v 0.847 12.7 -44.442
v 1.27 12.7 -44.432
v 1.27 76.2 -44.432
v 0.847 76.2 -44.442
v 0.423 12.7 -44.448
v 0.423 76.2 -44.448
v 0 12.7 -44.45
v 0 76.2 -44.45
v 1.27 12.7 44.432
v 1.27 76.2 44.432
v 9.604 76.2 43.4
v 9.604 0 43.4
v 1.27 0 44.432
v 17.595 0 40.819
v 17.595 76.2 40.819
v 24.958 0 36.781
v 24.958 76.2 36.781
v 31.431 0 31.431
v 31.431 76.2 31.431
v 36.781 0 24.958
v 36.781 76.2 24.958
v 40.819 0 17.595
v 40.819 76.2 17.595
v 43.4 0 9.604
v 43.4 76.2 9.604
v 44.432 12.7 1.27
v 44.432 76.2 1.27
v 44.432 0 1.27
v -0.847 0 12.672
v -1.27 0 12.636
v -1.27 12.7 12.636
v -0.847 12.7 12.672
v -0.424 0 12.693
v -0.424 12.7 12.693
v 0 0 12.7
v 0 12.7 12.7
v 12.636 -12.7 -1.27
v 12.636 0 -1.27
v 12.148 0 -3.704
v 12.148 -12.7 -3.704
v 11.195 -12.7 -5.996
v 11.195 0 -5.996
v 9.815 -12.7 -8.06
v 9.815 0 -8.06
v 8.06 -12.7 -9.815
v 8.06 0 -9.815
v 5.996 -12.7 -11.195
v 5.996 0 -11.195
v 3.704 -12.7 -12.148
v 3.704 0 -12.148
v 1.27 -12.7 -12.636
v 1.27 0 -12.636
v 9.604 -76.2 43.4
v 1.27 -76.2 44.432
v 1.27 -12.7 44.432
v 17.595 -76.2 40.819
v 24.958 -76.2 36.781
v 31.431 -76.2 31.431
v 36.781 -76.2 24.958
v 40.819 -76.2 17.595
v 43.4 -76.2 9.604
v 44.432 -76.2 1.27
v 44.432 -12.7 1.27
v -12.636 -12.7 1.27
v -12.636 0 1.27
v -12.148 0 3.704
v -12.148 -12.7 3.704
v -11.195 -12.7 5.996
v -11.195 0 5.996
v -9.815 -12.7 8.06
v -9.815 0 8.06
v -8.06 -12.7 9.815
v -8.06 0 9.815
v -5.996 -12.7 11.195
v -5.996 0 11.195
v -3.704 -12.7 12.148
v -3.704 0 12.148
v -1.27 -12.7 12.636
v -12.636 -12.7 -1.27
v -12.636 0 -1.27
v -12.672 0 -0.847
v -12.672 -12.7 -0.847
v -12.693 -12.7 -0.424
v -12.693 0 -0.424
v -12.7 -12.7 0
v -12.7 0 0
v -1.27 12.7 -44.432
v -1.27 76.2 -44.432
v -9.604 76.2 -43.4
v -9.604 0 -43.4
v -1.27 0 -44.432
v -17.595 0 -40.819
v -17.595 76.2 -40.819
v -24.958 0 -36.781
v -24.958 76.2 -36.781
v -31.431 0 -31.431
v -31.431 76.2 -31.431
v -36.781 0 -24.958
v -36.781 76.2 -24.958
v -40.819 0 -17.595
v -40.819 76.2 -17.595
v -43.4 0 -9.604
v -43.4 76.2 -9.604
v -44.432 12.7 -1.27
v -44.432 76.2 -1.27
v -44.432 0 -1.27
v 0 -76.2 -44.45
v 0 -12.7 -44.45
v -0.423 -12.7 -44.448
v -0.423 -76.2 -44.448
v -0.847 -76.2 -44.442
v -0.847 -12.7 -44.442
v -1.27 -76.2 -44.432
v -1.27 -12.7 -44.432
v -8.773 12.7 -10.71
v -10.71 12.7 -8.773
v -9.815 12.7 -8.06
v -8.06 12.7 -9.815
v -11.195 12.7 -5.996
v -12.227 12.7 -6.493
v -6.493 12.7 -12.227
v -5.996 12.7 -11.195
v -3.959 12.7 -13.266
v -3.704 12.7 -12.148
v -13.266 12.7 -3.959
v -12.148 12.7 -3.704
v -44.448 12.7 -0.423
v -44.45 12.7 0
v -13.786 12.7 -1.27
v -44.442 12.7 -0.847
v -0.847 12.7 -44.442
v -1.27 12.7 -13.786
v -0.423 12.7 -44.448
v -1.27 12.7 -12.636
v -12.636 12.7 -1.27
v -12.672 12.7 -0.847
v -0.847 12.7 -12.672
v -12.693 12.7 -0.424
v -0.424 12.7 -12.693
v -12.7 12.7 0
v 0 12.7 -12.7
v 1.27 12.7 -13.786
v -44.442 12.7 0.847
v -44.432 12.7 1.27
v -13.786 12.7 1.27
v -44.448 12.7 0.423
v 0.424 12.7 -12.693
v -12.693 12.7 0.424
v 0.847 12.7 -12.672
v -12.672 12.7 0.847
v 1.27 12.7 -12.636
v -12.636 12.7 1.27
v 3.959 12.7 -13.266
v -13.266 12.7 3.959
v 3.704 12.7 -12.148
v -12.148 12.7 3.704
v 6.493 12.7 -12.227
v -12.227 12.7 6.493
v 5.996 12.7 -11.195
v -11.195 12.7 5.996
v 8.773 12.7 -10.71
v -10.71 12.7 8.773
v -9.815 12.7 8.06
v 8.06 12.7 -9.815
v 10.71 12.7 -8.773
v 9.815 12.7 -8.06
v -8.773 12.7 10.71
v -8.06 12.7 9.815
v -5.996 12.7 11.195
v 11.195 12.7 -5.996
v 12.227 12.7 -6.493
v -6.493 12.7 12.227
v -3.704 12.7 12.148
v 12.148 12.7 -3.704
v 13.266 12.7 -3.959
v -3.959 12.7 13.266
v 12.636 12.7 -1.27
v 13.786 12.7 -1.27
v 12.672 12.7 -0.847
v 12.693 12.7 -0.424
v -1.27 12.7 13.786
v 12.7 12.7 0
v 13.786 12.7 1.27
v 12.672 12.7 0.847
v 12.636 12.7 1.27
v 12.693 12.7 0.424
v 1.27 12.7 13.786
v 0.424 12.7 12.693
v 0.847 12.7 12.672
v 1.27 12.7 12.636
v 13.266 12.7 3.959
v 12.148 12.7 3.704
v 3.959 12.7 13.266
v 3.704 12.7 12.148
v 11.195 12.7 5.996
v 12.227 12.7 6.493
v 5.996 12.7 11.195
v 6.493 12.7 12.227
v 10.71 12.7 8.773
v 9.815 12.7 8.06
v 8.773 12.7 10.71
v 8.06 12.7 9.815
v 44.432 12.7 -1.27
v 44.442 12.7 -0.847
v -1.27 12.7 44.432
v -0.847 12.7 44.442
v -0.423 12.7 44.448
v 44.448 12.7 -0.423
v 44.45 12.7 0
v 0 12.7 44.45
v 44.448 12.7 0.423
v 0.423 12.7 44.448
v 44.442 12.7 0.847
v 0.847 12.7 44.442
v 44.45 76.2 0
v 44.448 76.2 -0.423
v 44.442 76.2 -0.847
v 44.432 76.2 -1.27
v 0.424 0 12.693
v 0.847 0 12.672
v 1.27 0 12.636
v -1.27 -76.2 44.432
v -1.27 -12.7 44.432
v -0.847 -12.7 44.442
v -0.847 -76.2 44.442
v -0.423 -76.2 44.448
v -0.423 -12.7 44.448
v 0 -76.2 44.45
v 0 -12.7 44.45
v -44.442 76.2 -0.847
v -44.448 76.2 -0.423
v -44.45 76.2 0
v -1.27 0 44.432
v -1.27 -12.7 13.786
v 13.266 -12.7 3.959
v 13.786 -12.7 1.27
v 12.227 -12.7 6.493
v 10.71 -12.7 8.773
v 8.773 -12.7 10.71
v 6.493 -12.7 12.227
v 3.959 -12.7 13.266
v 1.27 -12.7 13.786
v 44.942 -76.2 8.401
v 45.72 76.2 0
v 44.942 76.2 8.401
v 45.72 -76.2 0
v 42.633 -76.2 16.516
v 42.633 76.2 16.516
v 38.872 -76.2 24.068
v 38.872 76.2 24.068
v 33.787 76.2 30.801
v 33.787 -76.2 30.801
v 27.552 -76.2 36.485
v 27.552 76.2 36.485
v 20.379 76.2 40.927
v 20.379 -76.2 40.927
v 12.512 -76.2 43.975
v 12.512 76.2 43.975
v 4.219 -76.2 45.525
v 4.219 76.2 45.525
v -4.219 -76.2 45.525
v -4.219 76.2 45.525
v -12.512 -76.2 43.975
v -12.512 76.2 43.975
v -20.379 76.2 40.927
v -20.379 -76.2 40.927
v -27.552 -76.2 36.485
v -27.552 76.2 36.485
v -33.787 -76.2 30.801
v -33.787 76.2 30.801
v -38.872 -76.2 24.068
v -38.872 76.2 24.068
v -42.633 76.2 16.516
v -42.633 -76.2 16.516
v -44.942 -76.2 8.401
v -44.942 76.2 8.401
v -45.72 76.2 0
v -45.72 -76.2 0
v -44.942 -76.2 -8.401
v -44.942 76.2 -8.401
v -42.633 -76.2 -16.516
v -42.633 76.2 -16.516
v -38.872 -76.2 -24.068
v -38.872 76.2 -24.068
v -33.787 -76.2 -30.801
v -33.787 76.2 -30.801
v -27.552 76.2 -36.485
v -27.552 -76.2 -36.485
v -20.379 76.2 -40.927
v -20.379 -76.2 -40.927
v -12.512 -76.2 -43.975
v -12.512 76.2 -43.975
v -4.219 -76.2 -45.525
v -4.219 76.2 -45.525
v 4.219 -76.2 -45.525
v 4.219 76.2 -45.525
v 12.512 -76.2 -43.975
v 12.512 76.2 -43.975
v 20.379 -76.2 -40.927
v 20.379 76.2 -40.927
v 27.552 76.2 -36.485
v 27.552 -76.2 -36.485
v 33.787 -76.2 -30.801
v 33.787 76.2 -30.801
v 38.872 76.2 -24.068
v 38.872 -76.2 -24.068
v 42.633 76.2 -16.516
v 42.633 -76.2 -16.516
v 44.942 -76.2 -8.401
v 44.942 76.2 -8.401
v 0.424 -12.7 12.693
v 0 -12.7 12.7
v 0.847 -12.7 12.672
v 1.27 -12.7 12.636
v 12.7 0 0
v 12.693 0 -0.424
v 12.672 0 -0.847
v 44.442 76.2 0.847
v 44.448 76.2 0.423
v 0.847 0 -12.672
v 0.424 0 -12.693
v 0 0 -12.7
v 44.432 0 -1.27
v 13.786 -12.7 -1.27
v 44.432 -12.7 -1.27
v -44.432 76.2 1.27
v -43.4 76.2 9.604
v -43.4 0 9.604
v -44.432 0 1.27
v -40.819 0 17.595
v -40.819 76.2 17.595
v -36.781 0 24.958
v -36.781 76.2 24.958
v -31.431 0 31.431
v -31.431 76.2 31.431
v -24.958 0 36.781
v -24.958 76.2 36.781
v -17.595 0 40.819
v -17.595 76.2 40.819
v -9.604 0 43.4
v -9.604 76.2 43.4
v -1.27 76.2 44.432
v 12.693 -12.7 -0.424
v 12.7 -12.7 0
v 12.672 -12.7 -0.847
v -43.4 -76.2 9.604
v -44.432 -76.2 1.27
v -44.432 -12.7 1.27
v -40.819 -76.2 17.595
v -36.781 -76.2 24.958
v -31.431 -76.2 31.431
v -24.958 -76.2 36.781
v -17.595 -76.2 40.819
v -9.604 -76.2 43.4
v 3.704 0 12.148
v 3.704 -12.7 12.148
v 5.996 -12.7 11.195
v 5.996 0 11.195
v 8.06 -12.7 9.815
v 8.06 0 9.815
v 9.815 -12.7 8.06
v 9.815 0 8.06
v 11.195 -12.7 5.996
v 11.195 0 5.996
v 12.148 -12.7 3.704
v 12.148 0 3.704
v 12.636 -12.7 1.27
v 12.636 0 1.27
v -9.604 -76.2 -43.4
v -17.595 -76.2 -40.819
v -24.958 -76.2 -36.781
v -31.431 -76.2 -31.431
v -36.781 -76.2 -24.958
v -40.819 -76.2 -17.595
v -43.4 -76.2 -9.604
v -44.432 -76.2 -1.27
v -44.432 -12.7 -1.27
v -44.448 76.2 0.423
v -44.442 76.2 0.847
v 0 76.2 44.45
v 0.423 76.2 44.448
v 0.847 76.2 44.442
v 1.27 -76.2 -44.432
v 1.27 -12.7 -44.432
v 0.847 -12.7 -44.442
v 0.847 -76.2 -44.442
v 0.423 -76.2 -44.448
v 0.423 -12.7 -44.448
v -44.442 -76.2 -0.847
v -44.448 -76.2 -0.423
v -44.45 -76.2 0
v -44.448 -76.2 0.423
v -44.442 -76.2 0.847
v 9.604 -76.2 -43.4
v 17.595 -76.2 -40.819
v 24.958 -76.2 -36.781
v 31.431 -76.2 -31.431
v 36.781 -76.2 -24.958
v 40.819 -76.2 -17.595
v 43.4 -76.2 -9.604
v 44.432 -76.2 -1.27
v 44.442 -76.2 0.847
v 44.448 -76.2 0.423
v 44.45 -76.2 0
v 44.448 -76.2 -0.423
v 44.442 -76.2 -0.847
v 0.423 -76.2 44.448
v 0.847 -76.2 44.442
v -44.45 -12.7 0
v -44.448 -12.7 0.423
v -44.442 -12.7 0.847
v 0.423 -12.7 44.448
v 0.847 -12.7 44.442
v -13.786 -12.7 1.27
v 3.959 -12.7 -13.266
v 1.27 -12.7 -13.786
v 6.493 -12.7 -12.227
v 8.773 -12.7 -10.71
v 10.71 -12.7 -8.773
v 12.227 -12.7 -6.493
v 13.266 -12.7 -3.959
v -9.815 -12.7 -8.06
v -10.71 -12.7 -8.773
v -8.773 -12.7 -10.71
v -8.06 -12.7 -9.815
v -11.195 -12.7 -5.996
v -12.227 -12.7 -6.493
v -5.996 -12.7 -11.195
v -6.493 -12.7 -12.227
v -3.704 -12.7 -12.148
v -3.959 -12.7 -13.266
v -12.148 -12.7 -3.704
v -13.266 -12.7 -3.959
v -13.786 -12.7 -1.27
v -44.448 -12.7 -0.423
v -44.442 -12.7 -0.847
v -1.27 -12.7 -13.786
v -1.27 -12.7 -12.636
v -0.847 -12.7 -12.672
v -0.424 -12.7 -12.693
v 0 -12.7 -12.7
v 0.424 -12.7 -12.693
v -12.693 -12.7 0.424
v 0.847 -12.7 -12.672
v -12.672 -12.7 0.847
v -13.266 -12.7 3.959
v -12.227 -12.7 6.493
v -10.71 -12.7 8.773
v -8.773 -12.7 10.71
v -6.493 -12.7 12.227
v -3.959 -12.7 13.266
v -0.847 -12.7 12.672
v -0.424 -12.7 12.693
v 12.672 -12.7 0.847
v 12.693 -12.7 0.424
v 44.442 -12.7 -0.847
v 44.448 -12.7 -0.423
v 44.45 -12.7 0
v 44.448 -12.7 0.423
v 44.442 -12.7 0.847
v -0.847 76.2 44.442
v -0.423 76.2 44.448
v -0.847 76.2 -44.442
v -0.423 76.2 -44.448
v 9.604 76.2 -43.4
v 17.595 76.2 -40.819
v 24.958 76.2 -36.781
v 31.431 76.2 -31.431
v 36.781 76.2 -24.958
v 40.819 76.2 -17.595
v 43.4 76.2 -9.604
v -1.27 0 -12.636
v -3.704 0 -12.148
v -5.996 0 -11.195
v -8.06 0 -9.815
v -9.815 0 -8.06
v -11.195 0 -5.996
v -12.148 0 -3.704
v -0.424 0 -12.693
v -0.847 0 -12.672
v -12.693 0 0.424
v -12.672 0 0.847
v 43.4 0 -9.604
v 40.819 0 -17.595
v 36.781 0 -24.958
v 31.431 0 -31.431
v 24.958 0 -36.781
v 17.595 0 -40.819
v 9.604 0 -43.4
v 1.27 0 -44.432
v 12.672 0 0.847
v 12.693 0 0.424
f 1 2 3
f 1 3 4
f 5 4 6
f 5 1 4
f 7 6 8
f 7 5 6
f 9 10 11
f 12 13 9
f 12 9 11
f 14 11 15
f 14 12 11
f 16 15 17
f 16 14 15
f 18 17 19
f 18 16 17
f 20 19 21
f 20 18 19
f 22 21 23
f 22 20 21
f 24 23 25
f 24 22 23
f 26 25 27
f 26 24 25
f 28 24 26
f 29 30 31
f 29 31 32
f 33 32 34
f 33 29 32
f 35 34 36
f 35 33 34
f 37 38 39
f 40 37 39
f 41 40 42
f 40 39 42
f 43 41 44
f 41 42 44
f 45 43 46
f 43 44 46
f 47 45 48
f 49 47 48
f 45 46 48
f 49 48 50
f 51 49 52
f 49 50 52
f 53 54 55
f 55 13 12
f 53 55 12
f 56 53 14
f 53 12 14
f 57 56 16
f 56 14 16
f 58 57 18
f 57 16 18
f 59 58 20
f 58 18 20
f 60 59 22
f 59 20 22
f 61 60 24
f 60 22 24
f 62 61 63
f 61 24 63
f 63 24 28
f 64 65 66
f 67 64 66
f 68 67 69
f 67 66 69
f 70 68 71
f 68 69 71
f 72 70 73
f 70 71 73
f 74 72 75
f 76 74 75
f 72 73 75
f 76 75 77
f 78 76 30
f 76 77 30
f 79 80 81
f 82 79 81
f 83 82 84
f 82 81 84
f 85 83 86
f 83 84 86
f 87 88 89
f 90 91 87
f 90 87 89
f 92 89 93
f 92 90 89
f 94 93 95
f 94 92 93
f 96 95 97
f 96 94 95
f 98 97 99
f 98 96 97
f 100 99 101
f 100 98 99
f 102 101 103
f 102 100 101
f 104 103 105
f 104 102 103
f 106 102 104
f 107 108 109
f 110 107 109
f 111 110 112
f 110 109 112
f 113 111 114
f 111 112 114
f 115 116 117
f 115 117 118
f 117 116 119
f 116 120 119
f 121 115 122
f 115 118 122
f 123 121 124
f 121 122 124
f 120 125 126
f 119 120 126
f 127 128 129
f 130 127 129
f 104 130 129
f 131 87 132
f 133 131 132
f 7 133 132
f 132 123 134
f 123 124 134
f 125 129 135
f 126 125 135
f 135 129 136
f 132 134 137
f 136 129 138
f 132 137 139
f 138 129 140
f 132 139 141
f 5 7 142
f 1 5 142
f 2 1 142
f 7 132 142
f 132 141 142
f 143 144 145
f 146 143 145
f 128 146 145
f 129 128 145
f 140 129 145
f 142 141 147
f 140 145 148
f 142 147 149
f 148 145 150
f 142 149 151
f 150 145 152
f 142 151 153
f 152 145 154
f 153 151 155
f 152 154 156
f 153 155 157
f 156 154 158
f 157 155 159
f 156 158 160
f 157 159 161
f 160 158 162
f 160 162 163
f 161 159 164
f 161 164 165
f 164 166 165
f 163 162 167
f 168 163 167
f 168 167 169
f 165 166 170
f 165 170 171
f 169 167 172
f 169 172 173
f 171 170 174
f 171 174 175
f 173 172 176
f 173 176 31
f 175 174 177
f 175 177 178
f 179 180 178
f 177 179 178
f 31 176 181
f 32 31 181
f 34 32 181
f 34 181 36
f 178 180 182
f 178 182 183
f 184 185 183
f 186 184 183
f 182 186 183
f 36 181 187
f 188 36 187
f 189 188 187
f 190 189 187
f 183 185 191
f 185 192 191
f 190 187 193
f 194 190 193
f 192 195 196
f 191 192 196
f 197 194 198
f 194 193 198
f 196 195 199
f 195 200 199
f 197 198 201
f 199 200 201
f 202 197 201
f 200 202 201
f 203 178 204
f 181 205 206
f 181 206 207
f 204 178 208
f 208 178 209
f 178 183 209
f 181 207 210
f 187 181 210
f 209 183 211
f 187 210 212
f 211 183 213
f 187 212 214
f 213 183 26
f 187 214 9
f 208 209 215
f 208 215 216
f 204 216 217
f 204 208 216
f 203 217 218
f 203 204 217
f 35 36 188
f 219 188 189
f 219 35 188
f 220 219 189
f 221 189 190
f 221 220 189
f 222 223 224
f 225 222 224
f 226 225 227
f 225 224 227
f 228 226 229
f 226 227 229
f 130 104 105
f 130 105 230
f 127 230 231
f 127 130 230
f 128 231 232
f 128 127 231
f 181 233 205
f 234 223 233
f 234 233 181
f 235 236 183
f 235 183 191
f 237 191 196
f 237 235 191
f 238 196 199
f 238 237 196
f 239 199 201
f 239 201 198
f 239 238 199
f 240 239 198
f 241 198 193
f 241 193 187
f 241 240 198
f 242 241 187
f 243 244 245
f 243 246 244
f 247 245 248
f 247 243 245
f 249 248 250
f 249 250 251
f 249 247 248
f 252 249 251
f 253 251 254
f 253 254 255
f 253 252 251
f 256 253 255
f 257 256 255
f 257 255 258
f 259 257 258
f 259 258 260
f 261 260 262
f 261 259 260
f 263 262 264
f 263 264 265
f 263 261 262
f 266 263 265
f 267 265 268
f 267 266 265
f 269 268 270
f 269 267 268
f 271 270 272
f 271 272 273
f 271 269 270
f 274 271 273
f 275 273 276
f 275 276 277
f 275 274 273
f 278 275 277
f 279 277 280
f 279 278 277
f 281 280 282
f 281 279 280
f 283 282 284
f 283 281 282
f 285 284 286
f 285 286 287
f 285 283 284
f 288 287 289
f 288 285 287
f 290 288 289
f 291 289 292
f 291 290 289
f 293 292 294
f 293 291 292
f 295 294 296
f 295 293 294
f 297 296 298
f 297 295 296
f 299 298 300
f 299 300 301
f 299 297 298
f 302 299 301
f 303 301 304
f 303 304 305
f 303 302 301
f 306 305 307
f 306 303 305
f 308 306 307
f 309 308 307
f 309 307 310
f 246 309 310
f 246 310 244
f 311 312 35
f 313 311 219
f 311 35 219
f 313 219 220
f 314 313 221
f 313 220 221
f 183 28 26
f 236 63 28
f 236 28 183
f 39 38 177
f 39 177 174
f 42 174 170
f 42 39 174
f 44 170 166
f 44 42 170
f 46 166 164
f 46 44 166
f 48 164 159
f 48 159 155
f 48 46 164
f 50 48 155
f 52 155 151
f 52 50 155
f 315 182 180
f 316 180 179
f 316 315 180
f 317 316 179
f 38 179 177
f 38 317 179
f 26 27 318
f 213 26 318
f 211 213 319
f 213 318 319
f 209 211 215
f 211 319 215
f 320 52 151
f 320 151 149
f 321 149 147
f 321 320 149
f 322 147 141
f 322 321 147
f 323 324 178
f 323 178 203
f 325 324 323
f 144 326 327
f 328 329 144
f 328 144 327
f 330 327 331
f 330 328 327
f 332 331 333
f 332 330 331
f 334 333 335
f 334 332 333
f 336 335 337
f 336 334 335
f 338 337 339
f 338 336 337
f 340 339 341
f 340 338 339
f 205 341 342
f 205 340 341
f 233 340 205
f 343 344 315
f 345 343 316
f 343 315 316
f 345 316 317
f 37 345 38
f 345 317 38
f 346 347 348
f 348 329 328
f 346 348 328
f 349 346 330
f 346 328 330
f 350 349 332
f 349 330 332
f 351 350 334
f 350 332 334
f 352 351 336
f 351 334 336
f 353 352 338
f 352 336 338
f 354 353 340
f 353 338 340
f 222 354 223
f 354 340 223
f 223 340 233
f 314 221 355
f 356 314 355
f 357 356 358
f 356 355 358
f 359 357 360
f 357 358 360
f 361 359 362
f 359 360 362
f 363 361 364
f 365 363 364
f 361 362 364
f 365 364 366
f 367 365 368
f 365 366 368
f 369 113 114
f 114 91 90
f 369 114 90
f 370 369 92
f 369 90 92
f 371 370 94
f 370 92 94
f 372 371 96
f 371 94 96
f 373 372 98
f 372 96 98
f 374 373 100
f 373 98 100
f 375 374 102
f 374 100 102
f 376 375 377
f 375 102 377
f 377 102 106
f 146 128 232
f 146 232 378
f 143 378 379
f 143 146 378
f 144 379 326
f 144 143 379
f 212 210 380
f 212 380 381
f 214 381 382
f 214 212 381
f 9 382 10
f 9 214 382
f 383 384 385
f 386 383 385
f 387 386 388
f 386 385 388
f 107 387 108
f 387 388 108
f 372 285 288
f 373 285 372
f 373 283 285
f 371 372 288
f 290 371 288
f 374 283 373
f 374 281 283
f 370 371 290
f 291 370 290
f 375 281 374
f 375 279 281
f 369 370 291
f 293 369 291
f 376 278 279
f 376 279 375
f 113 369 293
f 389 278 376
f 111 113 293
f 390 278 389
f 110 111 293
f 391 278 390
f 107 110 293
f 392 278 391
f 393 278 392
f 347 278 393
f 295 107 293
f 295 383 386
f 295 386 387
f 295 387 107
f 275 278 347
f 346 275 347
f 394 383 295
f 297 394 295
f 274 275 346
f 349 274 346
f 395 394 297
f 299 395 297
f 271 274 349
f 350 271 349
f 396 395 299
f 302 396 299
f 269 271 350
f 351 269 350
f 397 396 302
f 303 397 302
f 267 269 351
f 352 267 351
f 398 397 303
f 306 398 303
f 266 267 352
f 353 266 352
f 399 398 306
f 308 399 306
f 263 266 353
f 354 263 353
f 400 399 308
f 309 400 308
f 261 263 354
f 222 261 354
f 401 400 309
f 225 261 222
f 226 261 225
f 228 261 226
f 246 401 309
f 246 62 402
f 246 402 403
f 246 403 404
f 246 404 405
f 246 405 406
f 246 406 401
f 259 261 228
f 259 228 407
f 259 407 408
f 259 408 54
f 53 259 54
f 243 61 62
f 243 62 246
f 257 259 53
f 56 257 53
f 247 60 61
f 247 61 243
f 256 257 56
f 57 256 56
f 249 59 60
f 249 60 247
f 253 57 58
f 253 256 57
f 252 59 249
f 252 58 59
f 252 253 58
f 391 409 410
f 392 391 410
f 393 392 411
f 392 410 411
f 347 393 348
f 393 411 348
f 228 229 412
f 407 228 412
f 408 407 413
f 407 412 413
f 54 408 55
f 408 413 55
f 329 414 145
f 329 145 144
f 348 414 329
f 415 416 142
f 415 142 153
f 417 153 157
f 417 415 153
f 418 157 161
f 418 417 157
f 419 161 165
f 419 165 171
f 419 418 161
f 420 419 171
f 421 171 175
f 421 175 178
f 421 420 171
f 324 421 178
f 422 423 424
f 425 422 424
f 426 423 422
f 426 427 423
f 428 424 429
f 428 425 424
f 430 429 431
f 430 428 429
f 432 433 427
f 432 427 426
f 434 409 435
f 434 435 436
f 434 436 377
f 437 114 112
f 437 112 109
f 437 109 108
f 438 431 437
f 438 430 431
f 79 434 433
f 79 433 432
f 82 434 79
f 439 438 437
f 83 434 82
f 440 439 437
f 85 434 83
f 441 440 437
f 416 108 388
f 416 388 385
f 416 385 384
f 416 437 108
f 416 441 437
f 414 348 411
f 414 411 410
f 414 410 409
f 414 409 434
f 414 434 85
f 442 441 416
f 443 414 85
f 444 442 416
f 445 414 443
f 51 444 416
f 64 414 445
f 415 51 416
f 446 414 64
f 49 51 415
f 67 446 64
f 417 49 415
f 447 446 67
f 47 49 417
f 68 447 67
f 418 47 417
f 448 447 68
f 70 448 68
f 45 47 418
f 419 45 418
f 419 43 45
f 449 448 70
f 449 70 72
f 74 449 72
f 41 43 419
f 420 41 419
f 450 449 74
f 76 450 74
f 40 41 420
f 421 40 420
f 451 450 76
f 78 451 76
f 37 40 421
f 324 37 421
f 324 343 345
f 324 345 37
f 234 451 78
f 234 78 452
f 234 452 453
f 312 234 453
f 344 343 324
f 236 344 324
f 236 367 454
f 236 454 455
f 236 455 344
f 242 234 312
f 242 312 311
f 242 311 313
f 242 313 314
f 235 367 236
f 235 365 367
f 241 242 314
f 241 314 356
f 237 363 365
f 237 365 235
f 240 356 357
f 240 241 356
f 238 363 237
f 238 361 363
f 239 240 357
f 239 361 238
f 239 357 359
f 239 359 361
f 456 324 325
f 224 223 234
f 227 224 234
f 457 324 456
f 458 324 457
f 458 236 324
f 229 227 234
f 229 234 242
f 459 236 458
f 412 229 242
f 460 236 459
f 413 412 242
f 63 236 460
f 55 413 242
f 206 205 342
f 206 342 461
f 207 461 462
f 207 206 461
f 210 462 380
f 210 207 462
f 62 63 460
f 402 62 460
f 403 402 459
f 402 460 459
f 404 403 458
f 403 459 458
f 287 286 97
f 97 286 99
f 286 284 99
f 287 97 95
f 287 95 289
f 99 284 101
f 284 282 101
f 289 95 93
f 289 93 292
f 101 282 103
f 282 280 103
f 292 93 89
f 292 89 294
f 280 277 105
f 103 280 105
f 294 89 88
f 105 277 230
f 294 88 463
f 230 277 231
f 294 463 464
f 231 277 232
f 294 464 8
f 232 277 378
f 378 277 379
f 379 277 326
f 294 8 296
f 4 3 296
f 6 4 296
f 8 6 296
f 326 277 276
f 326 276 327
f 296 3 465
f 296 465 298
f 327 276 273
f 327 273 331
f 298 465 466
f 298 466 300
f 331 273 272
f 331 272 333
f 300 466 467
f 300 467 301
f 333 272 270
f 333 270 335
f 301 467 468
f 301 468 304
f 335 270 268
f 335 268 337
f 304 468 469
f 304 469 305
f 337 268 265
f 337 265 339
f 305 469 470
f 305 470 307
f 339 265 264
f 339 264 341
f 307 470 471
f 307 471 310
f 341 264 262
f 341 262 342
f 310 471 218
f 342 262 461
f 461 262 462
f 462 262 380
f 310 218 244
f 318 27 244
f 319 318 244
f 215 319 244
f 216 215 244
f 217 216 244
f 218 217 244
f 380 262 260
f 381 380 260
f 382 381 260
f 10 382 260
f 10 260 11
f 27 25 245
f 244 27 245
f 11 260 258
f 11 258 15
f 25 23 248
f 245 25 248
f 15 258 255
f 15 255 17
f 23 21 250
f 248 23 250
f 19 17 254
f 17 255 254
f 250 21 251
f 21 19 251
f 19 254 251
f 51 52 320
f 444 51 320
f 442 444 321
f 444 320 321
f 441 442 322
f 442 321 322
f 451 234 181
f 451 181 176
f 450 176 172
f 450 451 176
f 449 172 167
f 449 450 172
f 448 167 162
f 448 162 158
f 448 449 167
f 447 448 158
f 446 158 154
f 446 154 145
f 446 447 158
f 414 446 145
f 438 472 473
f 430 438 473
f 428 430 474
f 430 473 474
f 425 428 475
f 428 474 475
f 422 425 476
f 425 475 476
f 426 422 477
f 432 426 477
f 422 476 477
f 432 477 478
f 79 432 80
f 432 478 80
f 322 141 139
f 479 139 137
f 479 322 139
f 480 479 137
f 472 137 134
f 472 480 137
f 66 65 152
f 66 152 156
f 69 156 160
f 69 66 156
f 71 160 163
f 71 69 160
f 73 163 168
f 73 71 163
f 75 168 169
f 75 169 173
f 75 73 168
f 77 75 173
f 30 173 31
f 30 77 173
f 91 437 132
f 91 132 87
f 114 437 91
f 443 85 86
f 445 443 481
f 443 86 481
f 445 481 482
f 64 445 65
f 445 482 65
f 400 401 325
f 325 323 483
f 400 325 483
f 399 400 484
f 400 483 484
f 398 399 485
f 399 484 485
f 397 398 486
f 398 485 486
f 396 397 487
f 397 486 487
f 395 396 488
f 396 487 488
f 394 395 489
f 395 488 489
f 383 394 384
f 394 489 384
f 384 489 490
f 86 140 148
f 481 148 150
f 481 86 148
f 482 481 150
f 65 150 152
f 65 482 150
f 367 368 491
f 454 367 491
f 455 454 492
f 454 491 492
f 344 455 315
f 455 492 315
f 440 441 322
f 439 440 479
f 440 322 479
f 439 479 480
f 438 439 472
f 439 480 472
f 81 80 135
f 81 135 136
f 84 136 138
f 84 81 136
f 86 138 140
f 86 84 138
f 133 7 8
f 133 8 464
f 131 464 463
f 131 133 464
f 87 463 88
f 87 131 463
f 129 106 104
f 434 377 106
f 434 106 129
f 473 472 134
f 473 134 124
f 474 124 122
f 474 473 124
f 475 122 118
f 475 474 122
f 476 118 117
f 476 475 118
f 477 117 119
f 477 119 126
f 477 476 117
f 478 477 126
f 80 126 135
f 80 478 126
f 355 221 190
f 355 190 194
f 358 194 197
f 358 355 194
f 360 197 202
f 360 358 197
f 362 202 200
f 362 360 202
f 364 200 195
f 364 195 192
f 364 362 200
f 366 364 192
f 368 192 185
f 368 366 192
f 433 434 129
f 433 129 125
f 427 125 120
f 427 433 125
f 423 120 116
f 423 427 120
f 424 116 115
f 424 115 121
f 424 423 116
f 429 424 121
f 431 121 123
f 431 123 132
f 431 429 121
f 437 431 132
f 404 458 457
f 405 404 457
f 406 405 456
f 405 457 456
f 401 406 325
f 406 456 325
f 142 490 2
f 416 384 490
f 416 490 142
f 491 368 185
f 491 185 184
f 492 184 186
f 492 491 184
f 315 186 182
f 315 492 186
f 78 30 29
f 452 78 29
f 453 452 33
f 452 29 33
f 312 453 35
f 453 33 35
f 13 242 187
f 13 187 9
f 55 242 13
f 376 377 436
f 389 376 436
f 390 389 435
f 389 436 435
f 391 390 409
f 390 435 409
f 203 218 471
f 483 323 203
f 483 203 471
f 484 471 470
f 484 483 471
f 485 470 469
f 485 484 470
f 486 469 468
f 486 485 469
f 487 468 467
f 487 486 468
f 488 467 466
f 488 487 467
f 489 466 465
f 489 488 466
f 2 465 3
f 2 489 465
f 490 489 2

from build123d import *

# Parameters (mm, degrees)
F0_R     = 45.72
F1_DEPTH = 76.2
F2_DEPTH = 12.7


with BuildPart() as f1:
    # F0 (on Front) → F1 (new body, symmetric)
    with BuildSketch(Plane.XZ):
        Circle(F0_R)
        with BuildLine():
            ThreePointArc((44.4318571429, 1.2698704016), (44.4454640543, 0.635), (44.45, 0))
            ThreePointArc((44.45, 0), (44.4454640543, -0.635), (44.4318571429, -1.2698704016))
            ThreePointArc((44.4318571429, -1.2698704016), (31.4308964237, -31.4308964237), (1.2698704016, -44.4318571429))
            ThreePointArc((1.2698704016, -44.4318571429), (0.635, -44.4454640543), (0, -44.45))
            ThreePointArc((0, -44.45), (-0.635, -44.4454640543), (-1.2698704016, -44.4318571429))
            ThreePointArc((-1.2698704016, -44.4318571429), (-31.4308964237, -31.4308964237), (-44.4318571429, -1.2698704016))
            ThreePointArc((-44.4318571429, -1.2698704016), (-44.4454640543, -0.635), (-44.45, 0))
            ThreePointArc((-44.45, 0), (-44.4454640543, 0.635), (-44.4318571429, 1.2698704016))
            ThreePointArc((-44.4318571429, 1.2698704016), (-31.4308964237, 31.4308964237), (-1.2698704016, 44.4318571429))
            ThreePointArc((-1.2698704016, 44.4318571429), (-0.635, 44.4454640543), (0, 44.45))
            ThreePointArc((0, 44.45), (0.635, 44.4454640543), (1.2698704016, 44.4318571429))
            ThreePointArc((1.2698704016, 44.4318571429), (31.4308964237, 31.4308964237), (44.4318571429, 1.2698704016))
        make_face(mode=Mode.SUBTRACT)
    extrude(amount=F1_DEPTH, both=True)

    # F0 (on Front) → F2 (join, symmetric)
    with BuildSketch(Plane.XZ):
        with BuildLine():
            Line((-12.6363534757, 1.2698704016), (-13.7860050542, 1.2698704016))
            ThreePointArc((-13.7860050542, 1.2698704016), (-13.8297690489, 0.635605418), (-13.8443673092, 0))
            Line((-13.8443673092, 0), (-12.7, 0))
            ThreePointArc((-12.7, 0), (-12.6840783887, 0.6357321993), (-12.6363534757, 1.2698704016))
        make_face()
        with BuildLine():
            Line((-13.7860050542, 1.2698704016), (-44.4318571429, 1.2698704016))
            ThreePointArc((-44.4318571429, 1.2698704016), (-44.4454640543, 0.635), (-44.45, 0))
            Line((-44.45, 0), (-13.8443673092, 0))
            ThreePointArc((-13.8443673092, 0), (-13.8297690489, 0.635605418), (-13.7860050542, 1.2698704016))
        make_face()
        with BuildLine():
            Line((1.2698704016, 12.6363534757), (1.2698704016, 13.7860050542))
            ThreePointArc((1.2698704016, 13.7860050542), (0.635605418, 13.8297690489), (0, 13.8443673092))
            Line((0, 13.8443673092), (0, 12.7))
            ThreePointArc((0, 12.7), (0.6357321993, 12.6840783887), (1.2698704016, 12.6363534757))
        make_face()
        with BuildLine():
            Line((1.2698704016, 13.7860050542), (1.2698704016, 44.4318571429))
            ThreePointArc((1.2698704016, 44.4318571429), (0.635, 44.4454640543), (0, 44.45))
            Line((0, 44.45), (0, 13.8443673092))
            ThreePointArc((0, 13.8443673092), (0.635605418, 13.8297690489), (1.2698704016, 13.7860050542))
        make_face()
        with BuildLine():
            Line((12.7, 0), (13.8443673092, 0))
            ThreePointArc((13.8443673092, 0), (13.8297690489, 0.635605418), (13.7860050542, 1.2698704016))
            Line((13.7860050542, 1.2698704016), (12.6363534757, 1.2698704016))
            ThreePointArc((12.6363534757, 1.2698704016), (12.6840783887, 0.6357321993), (12.7, 0))
        make_face()
        with BuildLine():
            Line((13.8443673092, 0), (44.45, 0))
            ThreePointArc((44.45, 0), (44.4454640543, 0.635), (44.4318571429, 1.2698704016))
            Line((44.4318571429, 1.2698704016), (13.7860050542, 1.2698704016))
            ThreePointArc((13.7860050542, 1.2698704016), (13.8297690489, 0.635605418), (13.8443673092, 0))
        make_face()
        with BuildLine():
            ThreePointArc((-1.2698704016, -13.7860050542), (-0.635605418, -13.8297690489), (0, -13.8443673092))
            Line((0, -13.8443673092), (0, -12.7))
            ThreePointArc((0, -12.7), (-0.6357321993, -12.6840783887), (-1.2698704016, -12.6363534757))
            Line((-1.2698704016, -12.6363534757), (-1.2698704016, -13.7860050542))
        make_face()
        with BuildLine():
            ThreePointArc((-1.2698704016, -44.4318571429), (-0.635, -44.4454640543), (0, -44.45))
            Line((0, -44.45), (0, -13.8443673092))
            ThreePointArc((0, -13.8443673092), (-0.635605418, -13.8297690489), (-1.2698704016, -13.7860050542))
            Line((-1.2698704016, -13.7860050542), (-1.2698704016, -44.4318571429))
        make_face()
        with BuildLine():
            ThreePointArc((0, -13.8443673092), (0.635605418, -13.8297690489), (1.2698704016, -13.7860050542))
            Line((1.2698704016, -13.7860050542), (1.2698704016, -12.6363534757))
            ThreePointArc((1.2698704016, -12.6363534757), (0.6357321993, -12.6840783887), (0, -12.7))
            Line((0, -12.7), (0, -13.8443673092))
        make_face()
        with BuildLine():
            ThreePointArc((0, -44.45), (0.635, -44.4454640543), (1.2698704016, -44.4318571429))
            Line((1.2698704016, -44.4318571429), (1.2698704016, -13.7860050542))
            ThreePointArc((1.2698704016, -13.7860050542), (0.635605418, -13.8297690489), (0, -13.8443673092))
            Line((0, -13.8443673092), (0, -44.45))
        make_face()
        with BuildLine():
            ThreePointArc((-13.8443673092, 0), (-13.8297690489, -0.635605418), (-13.7860050542, -1.2698704016))
            Line((-13.7860050542, -1.2698704016), (-12.6363534757, -1.2698704016))
            ThreePointArc((-12.6363534757, -1.2698704016), (-12.6840783887, -0.6357321993), (-12.7, 0))
            Line((-12.7, 0), (-13.8443673092, 0))
        make_face()
        with BuildLine():
            ThreePointArc((-44.45, 0), (-44.4454640543, -0.635), (-44.4318571429, -1.2698704016))
            Line((-44.4318571429, -1.2698704016), (-13.7860050542, -1.2698704016))
            ThreePointArc((-13.7860050542, -1.2698704016), (-13.8297690489, -0.635605418), (-13.8443673092, 0))
            Line((-13.8443673092, 0), (-44.45, 0))
        make_face()
        with BuildLine():
            ThreePointArc((13.7860050542, -1.2698704016), (13.8297690489, -0.635605418), (13.8443673092, 0))
            Line((13.8443673092, 0), (12.7, 0))
            ThreePointArc((12.7, 0), (12.6840783887, -0.6357321993), (12.6363534757, -1.2698704016))
            Line((12.6363534757, -1.2698704016), (13.7860050542, -1.2698704016))
        make_face()
        with BuildLine():
            ThreePointArc((44.4318571429, -1.2698704016), (44.4454640543, -0.635), (44.45, 0))
            Line((44.45, 0), (13.8443673092, 0))
            ThreePointArc((13.8443673092, 0), (13.8297690489, -0.635605418), (13.7860050542, -1.2698704016))
            Line((13.7860050542, -1.2698704016), (44.4318571429, -1.2698704016))
        make_face()
        with BuildLine():
            ThreePointArc((-13.7860050542, -1.2698704016), (-9.7894460056, -9.7894460056), (-1.2698704016, -13.7860050542))
            Line((-1.2698704016, -13.7860050542), (-1.2698704016, -12.6363534757))
            ThreePointArc((-1.2698704016, -12.6363534757), (-8.9802561211, -8.9802561211), (-12.6363534757, -1.2698704016))
            Line((-12.6363534757, -1.2698704016), (-13.7860050542, -1.2698704016))
        make_face()
        with BuildLine():
            ThreePointArc((1.2698704016, -13.7860050542), (9.7894460056, -9.7894460056), (13.7860050542, -1.2698704016))
            Line((13.7860050542, -1.2698704016), (12.6363534757, -1.2698704016))
            ThreePointArc((12.6363534757, -1.2698704016), (8.9802561211, -8.9802561211), (1.2698704016, -12.6363534757))
            Line((1.2698704016, -12.6363534757), (1.2698704016, -13.7860050542))
        make_face()
        with BuildLine():
            Line((12.6363534757, 1.2698704016), (13.7860050542, 1.2698704016))
            ThreePointArc((13.7860050542, 1.2698704016), (9.7894460056, 9.7894460056), (1.2698704016, 13.7860050542))
            Line((1.2698704016, 13.7860050542), (1.2698704016, 12.6363534757))
            ThreePointArc((1.2698704016, 12.6363534757), (8.9802561211, 8.9802561211), (12.6363534757, 1.2698704016))
        make_face()
        with BuildLine():
            Line((-1.2698704016, 12.6363534757), (-1.2698704016, 13.7860050542))
            ThreePointArc((-1.2698704016, 13.7860050542), (-9.7894460056, 9.7894460056), (-13.7860050542, 1.2698704016))
            Line((-13.7860050542, 1.2698704016), (-12.6363534757, 1.2698704016))
            ThreePointArc((-12.6363534757, 1.2698704016), (-8.9802561211, 8.9802561211), (-1.2698704016, 12.6363534757))
        make_face()
        with BuildLine():
            Line((0, 13.8443673092), (0, 44.45))
            ThreePointArc((0, 44.45), (-0.635, 44.4454640543), (-1.2698704016, 44.4318571429))
            Line((-1.2698704016, 44.4318571429), (-1.2698704016, 13.7860050542))
            ThreePointArc((-1.2698704016, 13.7860050542), (-0.635605418, 13.8297690489), (0, 13.8443673092))
        make_face()
        with BuildLine():
            Line((0, 12.7), (0, 13.8443673092))
            ThreePointArc((0, 13.8443673092), (-0.635605418, 13.8297690489), (-1.2698704016, 13.7860050542))
            Line((-1.2698704016, 13.7860050542), (-1.2698704016, 12.6363534757))
            ThreePointArc((-1.2698704016, 12.6363534757), (-0.6357321993, 12.6840783887), (0, 12.7))
        make_face()
    extrude(amount=F2_DEPTH, both=True)


solid = f1.part
